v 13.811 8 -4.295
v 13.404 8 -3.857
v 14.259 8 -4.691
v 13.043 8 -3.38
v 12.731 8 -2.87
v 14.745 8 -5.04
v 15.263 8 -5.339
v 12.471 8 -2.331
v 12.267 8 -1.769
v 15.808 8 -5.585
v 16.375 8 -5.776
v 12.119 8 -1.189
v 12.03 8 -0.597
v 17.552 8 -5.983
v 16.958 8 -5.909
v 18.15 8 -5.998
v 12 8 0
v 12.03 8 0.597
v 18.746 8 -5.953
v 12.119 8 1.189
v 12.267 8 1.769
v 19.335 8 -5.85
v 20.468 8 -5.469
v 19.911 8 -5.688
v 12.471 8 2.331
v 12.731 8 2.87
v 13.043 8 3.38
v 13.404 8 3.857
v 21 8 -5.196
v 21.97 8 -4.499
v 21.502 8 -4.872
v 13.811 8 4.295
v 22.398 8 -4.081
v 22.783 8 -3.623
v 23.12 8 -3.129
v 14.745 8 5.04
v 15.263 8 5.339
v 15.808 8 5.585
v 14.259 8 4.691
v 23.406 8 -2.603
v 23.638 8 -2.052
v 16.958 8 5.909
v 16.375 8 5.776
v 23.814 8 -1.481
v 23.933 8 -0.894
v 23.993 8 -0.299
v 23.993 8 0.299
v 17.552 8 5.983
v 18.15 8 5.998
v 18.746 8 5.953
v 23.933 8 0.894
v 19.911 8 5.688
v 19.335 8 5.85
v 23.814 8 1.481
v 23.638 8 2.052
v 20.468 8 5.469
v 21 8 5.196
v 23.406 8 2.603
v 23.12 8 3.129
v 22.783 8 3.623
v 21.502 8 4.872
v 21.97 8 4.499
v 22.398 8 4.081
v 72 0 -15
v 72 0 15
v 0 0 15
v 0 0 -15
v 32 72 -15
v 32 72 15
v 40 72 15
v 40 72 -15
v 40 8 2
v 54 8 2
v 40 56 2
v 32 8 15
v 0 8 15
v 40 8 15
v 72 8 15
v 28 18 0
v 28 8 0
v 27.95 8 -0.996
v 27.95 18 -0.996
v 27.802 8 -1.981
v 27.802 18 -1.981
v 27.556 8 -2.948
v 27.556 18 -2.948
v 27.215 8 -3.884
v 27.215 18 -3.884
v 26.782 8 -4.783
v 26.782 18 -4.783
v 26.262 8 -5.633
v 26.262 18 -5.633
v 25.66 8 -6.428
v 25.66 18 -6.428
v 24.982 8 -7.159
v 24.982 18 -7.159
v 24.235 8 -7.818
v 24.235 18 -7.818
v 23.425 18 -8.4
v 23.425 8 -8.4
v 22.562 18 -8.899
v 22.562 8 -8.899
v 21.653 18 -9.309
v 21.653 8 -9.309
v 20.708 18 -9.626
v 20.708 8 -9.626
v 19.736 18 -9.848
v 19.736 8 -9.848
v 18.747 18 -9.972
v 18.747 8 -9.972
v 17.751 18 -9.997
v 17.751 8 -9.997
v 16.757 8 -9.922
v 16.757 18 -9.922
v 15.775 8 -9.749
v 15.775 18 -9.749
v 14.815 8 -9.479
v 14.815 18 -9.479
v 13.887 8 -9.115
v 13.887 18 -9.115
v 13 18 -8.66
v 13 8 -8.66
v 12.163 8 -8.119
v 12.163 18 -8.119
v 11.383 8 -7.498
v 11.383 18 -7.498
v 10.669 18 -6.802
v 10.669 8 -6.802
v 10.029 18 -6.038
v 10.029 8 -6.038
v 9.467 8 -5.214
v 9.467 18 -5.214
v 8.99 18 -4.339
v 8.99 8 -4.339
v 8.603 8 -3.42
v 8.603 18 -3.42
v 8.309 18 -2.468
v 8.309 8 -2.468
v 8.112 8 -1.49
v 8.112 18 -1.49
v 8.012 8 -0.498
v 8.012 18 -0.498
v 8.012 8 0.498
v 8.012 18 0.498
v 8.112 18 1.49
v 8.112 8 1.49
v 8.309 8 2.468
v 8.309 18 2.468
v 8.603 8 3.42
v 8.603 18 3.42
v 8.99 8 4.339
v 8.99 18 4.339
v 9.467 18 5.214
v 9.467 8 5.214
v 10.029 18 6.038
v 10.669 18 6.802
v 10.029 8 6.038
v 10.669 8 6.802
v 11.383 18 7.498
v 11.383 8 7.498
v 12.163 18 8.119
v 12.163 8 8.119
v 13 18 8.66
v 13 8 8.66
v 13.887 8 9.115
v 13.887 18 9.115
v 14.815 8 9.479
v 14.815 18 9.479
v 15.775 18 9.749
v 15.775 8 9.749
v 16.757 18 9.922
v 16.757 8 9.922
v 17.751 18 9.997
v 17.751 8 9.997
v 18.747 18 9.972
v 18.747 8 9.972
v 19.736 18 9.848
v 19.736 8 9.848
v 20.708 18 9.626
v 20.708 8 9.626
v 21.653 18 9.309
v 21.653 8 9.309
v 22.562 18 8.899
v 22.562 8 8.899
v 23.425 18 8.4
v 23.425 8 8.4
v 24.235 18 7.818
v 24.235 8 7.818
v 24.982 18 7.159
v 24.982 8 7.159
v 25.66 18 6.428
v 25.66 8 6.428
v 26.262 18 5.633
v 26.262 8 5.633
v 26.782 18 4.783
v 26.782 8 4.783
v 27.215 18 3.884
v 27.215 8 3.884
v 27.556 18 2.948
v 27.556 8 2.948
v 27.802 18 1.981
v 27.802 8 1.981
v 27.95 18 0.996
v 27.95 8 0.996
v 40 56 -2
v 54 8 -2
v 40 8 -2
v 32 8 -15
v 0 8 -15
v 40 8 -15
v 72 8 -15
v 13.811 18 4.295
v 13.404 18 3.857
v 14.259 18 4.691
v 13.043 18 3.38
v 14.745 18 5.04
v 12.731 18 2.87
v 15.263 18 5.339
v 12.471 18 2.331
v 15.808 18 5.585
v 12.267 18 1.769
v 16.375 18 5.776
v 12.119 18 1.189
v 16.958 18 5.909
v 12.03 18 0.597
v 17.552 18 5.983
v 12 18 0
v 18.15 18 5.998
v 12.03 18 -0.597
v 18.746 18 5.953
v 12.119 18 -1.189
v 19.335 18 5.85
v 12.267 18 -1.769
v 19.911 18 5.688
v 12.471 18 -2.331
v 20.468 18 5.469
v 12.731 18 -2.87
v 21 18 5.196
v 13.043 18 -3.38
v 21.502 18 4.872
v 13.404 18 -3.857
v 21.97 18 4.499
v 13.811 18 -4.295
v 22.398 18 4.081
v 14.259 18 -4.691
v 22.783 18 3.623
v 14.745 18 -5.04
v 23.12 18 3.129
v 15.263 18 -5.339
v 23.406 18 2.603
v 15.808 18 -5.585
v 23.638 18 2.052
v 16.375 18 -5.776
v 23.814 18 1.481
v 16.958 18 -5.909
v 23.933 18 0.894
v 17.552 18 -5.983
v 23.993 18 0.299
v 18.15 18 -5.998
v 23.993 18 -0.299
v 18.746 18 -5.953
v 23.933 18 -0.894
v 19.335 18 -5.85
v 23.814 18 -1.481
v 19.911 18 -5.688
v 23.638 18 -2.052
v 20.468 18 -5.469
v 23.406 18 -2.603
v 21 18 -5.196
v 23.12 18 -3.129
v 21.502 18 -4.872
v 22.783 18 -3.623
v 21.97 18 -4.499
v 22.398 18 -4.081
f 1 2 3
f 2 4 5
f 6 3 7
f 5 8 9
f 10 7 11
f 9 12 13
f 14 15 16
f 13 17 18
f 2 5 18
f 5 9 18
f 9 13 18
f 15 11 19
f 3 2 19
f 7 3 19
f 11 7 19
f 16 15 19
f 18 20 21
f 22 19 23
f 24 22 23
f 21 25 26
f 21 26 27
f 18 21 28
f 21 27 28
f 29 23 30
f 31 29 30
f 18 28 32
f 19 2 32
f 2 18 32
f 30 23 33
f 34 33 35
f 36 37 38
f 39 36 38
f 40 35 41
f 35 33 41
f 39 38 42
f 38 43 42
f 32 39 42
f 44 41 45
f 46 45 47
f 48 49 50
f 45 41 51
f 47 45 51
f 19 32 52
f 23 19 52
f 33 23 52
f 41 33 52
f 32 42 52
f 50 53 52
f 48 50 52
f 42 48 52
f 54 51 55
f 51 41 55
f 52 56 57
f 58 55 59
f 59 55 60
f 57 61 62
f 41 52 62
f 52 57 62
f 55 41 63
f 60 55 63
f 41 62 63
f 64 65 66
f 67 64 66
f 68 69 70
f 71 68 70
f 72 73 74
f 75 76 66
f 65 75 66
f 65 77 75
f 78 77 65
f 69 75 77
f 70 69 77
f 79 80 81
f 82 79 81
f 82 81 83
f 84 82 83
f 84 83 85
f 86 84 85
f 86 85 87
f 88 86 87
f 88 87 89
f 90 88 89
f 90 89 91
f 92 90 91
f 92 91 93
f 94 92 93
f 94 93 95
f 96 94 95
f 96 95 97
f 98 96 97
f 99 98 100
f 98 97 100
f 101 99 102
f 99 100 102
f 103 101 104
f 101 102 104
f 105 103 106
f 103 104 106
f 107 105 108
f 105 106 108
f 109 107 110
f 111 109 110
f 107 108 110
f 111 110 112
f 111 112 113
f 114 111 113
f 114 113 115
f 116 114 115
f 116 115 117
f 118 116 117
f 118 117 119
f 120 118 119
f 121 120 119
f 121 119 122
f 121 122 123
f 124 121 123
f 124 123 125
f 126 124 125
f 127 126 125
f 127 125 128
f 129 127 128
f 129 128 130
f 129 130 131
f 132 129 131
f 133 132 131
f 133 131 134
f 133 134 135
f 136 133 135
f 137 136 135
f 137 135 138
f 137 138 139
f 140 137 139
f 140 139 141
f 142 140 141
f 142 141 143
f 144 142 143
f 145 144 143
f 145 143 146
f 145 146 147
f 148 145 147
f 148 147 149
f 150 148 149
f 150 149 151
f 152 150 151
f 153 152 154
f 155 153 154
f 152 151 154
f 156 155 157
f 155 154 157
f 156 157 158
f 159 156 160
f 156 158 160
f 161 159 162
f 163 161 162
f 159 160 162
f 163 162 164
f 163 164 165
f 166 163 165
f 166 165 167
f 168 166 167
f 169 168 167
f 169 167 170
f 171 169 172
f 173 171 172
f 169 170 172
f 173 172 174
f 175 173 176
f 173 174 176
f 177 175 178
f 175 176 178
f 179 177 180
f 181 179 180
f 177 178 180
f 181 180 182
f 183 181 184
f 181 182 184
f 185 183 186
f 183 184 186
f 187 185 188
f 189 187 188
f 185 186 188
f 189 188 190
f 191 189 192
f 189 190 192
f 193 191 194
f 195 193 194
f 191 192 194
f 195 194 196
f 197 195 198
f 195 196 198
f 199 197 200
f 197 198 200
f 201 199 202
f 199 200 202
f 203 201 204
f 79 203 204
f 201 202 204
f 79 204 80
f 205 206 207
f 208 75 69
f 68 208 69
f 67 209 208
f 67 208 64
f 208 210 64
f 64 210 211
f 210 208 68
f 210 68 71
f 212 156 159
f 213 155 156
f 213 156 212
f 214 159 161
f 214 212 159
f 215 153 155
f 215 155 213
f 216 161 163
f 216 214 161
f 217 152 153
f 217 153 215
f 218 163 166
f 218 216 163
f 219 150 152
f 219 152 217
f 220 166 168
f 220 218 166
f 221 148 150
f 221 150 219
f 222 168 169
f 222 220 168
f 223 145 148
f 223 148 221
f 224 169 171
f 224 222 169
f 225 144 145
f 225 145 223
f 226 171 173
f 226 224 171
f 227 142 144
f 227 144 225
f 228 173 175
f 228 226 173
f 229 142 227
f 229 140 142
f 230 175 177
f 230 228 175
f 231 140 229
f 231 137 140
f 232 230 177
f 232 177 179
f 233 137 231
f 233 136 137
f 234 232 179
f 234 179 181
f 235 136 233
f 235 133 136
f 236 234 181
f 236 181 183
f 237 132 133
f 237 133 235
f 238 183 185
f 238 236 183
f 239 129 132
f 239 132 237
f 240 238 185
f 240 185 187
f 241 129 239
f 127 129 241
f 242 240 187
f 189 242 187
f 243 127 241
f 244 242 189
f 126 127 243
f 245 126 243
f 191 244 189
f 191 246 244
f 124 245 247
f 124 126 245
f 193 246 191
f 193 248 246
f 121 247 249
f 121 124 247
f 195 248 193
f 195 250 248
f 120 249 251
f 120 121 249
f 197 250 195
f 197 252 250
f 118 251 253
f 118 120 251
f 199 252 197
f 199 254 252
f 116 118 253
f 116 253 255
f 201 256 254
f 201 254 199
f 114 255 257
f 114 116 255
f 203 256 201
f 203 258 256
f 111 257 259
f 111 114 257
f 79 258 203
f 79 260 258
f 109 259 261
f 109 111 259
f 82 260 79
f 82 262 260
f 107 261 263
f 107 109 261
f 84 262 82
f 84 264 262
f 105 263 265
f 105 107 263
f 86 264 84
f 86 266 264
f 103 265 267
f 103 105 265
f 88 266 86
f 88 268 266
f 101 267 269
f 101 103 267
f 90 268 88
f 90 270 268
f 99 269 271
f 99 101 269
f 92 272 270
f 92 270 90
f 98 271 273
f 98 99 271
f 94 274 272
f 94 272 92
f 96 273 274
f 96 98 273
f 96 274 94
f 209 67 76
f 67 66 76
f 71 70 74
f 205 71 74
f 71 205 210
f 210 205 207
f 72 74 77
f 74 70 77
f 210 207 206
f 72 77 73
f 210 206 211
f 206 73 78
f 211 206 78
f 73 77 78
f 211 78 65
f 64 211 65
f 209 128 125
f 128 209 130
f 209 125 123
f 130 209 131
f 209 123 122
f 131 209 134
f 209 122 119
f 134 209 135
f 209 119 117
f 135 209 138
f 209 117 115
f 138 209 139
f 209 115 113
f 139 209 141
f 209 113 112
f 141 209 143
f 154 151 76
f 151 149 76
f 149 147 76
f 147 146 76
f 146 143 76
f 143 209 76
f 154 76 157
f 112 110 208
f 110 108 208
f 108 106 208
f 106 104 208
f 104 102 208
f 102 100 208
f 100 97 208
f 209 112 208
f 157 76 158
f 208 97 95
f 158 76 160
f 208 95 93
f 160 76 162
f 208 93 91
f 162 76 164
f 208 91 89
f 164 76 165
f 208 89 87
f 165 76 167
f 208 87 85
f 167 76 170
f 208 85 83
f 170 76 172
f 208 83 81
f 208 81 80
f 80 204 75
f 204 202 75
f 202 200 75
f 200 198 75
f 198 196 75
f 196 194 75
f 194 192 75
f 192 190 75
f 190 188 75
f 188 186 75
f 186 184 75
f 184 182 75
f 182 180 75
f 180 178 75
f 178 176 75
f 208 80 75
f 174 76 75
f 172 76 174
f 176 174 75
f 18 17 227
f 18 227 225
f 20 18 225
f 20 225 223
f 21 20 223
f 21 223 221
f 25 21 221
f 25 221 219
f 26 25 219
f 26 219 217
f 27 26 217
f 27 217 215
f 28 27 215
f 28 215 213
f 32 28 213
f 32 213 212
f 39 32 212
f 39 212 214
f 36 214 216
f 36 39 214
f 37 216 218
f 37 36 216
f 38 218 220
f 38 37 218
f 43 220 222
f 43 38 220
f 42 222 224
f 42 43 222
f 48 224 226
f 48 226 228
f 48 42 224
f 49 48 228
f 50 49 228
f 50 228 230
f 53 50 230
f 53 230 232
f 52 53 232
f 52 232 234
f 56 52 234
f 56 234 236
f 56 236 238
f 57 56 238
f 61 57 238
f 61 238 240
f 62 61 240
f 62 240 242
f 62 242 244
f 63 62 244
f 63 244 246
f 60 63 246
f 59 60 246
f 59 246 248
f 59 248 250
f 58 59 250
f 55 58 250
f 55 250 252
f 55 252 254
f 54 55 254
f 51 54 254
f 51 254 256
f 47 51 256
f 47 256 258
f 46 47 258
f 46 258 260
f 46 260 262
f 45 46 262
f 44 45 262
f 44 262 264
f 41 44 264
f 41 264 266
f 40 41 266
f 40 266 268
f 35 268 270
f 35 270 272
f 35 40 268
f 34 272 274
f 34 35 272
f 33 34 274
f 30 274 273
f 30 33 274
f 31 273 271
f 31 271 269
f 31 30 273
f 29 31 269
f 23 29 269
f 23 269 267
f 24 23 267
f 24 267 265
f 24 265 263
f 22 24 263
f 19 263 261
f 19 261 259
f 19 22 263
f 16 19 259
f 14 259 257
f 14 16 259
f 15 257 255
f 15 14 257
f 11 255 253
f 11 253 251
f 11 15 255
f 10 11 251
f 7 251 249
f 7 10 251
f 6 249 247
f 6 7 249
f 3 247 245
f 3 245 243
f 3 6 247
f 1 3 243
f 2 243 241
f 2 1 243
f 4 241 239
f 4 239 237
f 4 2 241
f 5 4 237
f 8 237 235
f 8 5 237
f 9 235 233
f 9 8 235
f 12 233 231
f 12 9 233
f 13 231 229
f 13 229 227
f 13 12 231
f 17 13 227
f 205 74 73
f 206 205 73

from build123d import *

# Parameters (mm, degrees)
SKETCH1_W           = 72
SKETCH1_H           = 72
BOSS_EXTRUDE1_DEPTH = 15
SKETCH4_W           = 32
SKETCH4_H           = 64
CUT_EXTRUDE1_DEPTH  = 30
SKETCH8_R           = 10
SKETCH8_R_2         = 6
BOSS_EXTRUDE2_DEPTH = 10
BOSS_EXTRUDE3_DEPTH = 2


with BuildPart() as part:
    # Sketch1 → Boss-Extrude1 (new, symmetric)
    with BuildSketch(Plane.XY):
        with Locations((36, 36)):
            Rectangle(SKETCH1_W, SKETCH1_H)
    extrude(amount=BOSS_EXTRUDE1_DEPTH, both=True)

    # Sketch4 → Cut-Extrude1 (cut)
    with BuildSketch(Plane.XY.offset(15)):
        with Locations((56, 40)):
            Rectangle(SKETCH4_W, SKETCH4_H)
        with Locations((16, 40)):
            Rectangle(SKETCH4_W, SKETCH4_H)
    extrude(amount=-CUT_EXTRUDE1_DEPTH, mode=Mode.SUBTRACT)

    # Sketch8 → Boss-Extrude2 (add)
    with BuildSketch(Plane(origin=(0, 8, 0), x_dir=(1, 0, 0), z_dir=(0, 1, 0))):
        with Locations((18, 0)):
            Circle(SKETCH8_R)
        with Locations(Location((18, 0, 0), (0, 0, 180))):
            Circle(SKETCH8_R_2, mode=Mode.SUBTRACT)
    extrude(amount=BOSS_EXTRUDE2_DEPTH)

    # Sketch10 → Boss-Extrude3 (add, symmetric)
    with BuildSketch(Plane.XY):
        Polygon((40, 56), (54, 8), (72, 8), (72, 0), (0, 0), (0, 8), (32, 8), (32, 72), (40, 72), align=None)
    extrude(amount=BOSS_EXTRUDE3_DEPTH, both=True)


solid = part.part
